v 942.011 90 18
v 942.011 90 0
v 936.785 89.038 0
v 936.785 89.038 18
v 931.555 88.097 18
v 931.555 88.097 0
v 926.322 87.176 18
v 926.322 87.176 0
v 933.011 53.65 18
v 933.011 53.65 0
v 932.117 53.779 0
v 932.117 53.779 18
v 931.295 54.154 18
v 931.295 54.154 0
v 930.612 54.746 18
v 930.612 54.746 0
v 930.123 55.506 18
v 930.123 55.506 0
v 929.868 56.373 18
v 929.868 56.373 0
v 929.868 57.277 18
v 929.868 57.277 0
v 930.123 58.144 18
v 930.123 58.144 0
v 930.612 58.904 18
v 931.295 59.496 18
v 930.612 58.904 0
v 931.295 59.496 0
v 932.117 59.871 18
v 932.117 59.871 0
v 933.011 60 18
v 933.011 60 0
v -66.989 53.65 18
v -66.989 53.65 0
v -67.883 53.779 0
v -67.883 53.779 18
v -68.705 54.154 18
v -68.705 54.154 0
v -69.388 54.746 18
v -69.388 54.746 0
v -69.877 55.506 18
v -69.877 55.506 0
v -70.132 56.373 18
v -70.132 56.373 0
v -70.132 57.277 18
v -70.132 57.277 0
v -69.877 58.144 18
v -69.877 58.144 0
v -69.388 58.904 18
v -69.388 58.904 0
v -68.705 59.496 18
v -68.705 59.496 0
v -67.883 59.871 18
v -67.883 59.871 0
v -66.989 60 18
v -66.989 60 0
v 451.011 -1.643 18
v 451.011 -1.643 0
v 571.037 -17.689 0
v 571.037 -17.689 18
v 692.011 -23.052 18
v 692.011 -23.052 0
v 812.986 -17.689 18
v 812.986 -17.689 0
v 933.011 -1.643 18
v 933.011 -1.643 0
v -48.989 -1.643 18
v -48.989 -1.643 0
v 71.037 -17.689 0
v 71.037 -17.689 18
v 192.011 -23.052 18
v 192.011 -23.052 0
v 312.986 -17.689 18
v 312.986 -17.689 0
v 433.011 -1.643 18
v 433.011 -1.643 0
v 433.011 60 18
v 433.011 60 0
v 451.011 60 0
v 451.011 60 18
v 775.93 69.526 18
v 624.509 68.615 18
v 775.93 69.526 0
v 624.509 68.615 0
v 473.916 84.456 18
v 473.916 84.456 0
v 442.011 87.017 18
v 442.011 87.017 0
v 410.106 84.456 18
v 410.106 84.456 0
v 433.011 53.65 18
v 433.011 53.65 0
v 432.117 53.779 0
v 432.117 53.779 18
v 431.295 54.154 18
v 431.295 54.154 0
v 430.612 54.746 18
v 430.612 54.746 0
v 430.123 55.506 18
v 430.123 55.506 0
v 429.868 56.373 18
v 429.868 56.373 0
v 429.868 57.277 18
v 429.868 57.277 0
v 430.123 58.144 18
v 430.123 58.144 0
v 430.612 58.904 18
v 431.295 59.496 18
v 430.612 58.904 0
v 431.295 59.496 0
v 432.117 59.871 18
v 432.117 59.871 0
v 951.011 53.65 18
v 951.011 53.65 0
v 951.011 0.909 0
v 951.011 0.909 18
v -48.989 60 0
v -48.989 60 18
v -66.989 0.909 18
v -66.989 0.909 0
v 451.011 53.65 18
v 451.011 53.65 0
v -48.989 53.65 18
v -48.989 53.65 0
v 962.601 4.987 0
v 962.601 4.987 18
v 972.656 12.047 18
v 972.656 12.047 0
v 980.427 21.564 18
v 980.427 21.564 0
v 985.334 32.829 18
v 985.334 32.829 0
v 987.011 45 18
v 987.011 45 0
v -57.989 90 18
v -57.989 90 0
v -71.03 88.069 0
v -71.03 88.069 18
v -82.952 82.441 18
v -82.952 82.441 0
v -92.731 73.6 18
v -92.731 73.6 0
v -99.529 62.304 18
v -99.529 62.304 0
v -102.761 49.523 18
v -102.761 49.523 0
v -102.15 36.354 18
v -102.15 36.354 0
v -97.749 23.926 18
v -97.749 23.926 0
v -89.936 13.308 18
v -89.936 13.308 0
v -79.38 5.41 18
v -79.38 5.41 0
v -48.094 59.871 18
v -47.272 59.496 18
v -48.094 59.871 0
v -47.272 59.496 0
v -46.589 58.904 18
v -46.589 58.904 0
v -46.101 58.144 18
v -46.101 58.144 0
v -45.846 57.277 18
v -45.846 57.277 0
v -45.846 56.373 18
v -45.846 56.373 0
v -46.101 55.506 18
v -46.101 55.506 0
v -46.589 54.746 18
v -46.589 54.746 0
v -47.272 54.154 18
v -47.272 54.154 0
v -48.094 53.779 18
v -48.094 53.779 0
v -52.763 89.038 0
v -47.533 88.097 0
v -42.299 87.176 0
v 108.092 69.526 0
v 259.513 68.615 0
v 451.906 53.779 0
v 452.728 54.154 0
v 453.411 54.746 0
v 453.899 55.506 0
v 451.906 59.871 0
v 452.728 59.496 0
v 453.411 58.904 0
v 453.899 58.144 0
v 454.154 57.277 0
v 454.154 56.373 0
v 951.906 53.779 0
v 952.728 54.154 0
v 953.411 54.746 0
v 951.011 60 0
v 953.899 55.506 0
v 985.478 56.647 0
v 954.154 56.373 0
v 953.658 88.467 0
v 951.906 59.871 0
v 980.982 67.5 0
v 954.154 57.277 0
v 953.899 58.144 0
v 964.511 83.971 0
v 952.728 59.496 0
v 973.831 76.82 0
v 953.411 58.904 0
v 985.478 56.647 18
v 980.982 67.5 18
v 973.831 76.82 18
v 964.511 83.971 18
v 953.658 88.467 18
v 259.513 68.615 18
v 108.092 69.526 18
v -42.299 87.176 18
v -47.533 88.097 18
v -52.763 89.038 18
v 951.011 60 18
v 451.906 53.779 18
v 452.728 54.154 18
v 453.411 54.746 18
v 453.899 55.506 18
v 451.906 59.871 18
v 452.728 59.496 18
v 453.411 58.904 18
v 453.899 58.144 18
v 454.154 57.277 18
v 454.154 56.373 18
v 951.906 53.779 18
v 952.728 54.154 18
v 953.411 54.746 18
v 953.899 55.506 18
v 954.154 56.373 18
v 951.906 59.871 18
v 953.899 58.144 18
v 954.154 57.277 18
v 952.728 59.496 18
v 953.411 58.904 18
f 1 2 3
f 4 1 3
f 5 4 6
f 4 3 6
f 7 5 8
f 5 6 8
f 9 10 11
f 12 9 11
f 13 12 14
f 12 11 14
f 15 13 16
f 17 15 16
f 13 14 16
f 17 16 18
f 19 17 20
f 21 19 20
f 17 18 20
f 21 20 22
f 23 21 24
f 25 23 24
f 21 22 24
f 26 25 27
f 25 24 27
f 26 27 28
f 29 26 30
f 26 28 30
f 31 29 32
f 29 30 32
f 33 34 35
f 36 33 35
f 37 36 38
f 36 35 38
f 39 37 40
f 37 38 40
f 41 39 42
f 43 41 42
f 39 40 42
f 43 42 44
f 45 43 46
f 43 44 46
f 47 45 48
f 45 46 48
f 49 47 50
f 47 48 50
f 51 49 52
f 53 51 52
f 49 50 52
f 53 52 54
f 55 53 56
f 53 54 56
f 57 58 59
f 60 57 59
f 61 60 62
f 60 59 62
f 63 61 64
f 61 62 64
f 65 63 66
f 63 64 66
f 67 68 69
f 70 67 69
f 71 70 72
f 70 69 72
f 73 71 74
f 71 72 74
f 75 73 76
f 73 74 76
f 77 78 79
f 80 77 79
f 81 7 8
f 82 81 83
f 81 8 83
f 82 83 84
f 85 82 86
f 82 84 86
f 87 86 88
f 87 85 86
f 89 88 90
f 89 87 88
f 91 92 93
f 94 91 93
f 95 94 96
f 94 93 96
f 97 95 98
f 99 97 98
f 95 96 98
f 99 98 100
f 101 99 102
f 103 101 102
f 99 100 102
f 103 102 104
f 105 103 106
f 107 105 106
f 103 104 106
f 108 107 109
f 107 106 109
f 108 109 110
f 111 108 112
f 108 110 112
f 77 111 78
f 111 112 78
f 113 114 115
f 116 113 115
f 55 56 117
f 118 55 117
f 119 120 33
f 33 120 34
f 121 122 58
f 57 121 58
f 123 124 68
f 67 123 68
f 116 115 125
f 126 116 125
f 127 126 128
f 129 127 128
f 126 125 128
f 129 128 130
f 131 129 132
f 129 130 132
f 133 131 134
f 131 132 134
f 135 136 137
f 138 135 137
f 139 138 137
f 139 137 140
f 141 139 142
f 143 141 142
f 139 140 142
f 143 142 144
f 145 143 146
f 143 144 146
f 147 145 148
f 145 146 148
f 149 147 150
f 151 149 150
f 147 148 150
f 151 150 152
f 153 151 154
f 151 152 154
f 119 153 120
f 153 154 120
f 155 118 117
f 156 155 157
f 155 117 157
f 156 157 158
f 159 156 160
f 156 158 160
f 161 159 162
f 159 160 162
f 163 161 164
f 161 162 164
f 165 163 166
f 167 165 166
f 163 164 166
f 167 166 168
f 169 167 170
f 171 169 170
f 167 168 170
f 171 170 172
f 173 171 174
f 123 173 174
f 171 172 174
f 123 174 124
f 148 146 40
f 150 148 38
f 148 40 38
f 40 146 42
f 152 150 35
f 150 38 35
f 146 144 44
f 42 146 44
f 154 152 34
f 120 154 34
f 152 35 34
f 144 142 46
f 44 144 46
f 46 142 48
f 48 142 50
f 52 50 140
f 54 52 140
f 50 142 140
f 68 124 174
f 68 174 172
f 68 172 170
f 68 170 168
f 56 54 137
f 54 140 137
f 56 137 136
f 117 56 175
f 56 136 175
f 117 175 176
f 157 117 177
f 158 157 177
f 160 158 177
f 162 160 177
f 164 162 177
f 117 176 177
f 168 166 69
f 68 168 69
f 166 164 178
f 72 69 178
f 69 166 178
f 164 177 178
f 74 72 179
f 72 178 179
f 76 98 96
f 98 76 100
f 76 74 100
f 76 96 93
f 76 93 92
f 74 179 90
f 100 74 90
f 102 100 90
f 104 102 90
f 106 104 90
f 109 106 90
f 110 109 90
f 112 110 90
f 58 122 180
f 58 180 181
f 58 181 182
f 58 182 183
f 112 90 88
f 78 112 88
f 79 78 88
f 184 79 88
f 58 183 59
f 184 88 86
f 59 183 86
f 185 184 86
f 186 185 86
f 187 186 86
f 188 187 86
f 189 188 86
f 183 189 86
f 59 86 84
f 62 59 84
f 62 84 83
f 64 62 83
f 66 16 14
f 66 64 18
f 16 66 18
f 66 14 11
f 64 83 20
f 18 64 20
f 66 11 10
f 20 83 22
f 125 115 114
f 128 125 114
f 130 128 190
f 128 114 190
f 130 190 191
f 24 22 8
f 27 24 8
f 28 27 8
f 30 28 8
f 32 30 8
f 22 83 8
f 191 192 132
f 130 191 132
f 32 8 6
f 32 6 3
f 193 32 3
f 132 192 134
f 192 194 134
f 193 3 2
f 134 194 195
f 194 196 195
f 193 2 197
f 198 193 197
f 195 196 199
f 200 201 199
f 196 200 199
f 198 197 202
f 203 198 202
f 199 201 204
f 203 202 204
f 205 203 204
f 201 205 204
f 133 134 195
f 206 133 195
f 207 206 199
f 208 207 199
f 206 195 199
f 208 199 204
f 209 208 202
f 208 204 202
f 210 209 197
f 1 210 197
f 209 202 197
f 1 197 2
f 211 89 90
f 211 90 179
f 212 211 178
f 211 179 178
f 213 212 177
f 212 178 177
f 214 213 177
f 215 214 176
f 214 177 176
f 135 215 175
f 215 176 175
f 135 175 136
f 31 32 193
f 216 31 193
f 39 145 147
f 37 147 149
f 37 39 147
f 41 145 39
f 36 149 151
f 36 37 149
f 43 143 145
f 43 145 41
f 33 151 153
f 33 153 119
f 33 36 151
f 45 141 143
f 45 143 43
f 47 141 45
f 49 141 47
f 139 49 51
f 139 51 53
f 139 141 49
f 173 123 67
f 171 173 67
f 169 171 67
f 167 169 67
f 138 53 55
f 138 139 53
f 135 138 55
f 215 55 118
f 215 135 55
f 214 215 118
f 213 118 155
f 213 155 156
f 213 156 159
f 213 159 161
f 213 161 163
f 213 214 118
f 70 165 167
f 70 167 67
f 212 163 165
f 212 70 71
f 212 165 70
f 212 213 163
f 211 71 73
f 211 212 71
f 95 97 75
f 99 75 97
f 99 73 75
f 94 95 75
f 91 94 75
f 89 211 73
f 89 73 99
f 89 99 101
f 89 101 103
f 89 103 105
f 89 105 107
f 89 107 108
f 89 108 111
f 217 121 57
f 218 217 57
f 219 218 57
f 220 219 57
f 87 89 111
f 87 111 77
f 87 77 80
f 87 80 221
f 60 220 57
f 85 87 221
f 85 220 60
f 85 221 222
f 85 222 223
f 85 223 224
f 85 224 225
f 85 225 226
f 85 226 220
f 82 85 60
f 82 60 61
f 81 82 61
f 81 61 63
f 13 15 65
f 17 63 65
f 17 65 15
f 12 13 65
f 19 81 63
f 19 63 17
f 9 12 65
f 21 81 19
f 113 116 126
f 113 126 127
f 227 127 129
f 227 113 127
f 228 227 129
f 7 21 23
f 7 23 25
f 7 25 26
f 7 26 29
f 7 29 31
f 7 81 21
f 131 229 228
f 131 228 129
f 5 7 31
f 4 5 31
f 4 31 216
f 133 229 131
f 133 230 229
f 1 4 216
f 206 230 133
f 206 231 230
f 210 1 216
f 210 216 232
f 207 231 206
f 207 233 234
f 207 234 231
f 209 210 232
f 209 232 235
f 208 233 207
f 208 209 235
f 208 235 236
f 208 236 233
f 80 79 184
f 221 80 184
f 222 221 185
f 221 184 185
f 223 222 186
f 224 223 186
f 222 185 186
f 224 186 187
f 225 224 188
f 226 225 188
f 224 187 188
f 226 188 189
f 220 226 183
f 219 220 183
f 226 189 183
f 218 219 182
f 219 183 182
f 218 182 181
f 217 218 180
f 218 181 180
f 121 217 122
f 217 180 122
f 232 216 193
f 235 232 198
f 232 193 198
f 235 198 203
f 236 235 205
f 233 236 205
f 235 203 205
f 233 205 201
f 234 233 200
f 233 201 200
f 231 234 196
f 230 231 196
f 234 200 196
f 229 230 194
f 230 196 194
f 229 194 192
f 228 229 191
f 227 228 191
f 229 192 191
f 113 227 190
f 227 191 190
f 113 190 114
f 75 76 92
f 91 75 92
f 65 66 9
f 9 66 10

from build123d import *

# Parameters (mm, degrees)
ESTRUSIONE_ESTRUSIONE1_DEPTH = 18
RACCORDO1_R                  = 200


with BuildPart() as part:
    # Schizzo1 → Estrusione-Estrusione1 (new body)
    with BuildSketch(Plane.XY):
        with BuildLine():
            ThreePointArc((-66.988913829, 53.65), (-70.163913829, 56.825), (-66.988913829, 60))
            Line((-66.988913829, 60), (-48.988913829, 60))
            ThreePointArc((-48.988913829, 60), (-45.813913829, 56.825), (-48.988913829, 53.65))
            Line((-48.988913829, 53.65), (-48.988913829, 0.90918463))
            ThreePointArc((-48.988913829, 0.90918463), (-23.132063713, 16.539501058), (-12.988913829, 45))
            ThreePointArc((-12.988913829, 45), (-21.036068748, 70.680483648), (-42.299457846, 87.176308171))
            ThreePointArc((-42.299457846, 87.176308171), (-50.148301569, 88.565285591), (-57.988913829, 90))
            ThreePointArc((-57.988913829, 90), (-102.761040714, 49.52290329), (-66.988913829, 0.90918463))
            Line((-66.988913829, 0.90918463), (-66.988913829, 53.65))
        make_face()
        with BuildLine():
            ThreePointArc((-12.988913829, 45), (-23.132063713, 16.539501058), (-48.988913829, 0.90918463))
            Line((-48.988913829, 0.90918463), (-48.988913829, -1.642858287))
            ThreePointArc((-48.988913829, -1.642858287), (192.011086171, -23.052237245), (433.011086171, -1.642858287))
            Line((433.011086171, -1.642858287), (433.011086171, 0.90918463))
            ThreePointArc((433.011086171, 0.90918463), (397.145771503, 41.520985802), (426.321630188, 87.176308171))
            ThreePointArc((426.321630188, 87.176308171), (192.011086171, 66.947762755), (-42.299457846, 87.176308171))
            ThreePointArc((-42.299457846, 87.176308171), (-21.036068748, 70.680483648), (-12.988913829, 45))
        make_face()
        with BuildLine():
            ThreePointArc((442.011086171, 90), (434.17047391, 88.565285591), (426.321630188, 87.176308171))
            ThreePointArc((426.321630188, 87.176308171), (397.145771503, 41.520985802), (433.011086171, 0.90918463))
            Line((433.011086171, 0.90918463), (433.011086171, 53.65))
            ThreePointArc((433.011086171, 53.65), (429.836086171, 56.825), (433.011086171, 60))
            Line((433.011086171, 60), (451.011086171, 60))
            ThreePointArc((451.011086171, 60), (454.186086171, 56.825), (451.011086171, 53.65))
            Line((451.011086171, 53.65), (451.011086171, 0.90918463))
            ThreePointArc((451.011086171, 0.90918463), (476.867936287, 16.539501058), (487.011086171, 45))
            ThreePointArc((487.011086171, 45), (478.963931252, 70.680483648), (457.700542154, 87.176308171))
            ThreePointArc((457.700542154, 87.176308171), (449.851698431, 88.565285591), (442.011086171, 90))
        make_face()
        with BuildLine():
            ThreePointArc((487.011086171, 45), (476.867936287, 16.539501058), (451.011086171, 0.90918463))
            Line((451.011086171, 0.90918463), (451.011086171, -1.642858287))
            ThreePointArc((451.011086171, -1.642858287), (692.011086171, -23.052237245), (933.011086171, -1.642858287))
            Line((933.011086171, -1.642858287), (933.011086171, 0.90918463))
            ThreePointArc((933.011086171, 0.90918463), (897.145771503, 41.520985802), (926.321630188, 87.176308171))
            ThreePointArc((926.321630188, 87.176308171), (692.011086171, 66.947762755), (457.700542154, 87.176308171))
            ThreePointArc((457.700542154, 87.176308171), (478.963931252, 70.680483648), (487.011086171, 45))
        make_face()
        with BuildLine():
            ThreePointArc((942.011086171, 90), (934.17047391, 88.565285591), (926.321630188, 87.176308171))
            ThreePointArc((926.321630188, 87.176308171), (897.145771503, 41.520985802), (933.011086171, 0.90918463))
            Line((933.011086171, 0.90918463), (933.011086171, 53.65))
            ThreePointArc((933.011086171, 53.65), (929.836086171, 56.825), (933.011086171, 60))
            Line((933.011086171, 60), (951.011086171, 60))
            ThreePointArc((951.011086171, 60), (954.186086171, 56.825), (951.011086171, 53.65))
            Line((951.011086171, 53.65), (951.011086171, 0.90918463))
            ThreePointArc((951.011086171, 0.90918463), (976.867936287, 16.539501058), (987.011086171, 45))
            ThreePointArc((987.011086171, 45), (973.830891324, 76.819805153), (942.011086171, 90))
        make_face()
    extrude(amount=ESTRUSIONE_ESTRUSIONE1_DEPTH)

    # Raccordo1
    raccordo1_edges = [part.edges().sort_by_distance(p)[0] for p in [
        (442.011086171, 90, 9),
    ]]
    fillet(raccordo1_edges, radius=RACCORDO1_R)


solid = part.part
